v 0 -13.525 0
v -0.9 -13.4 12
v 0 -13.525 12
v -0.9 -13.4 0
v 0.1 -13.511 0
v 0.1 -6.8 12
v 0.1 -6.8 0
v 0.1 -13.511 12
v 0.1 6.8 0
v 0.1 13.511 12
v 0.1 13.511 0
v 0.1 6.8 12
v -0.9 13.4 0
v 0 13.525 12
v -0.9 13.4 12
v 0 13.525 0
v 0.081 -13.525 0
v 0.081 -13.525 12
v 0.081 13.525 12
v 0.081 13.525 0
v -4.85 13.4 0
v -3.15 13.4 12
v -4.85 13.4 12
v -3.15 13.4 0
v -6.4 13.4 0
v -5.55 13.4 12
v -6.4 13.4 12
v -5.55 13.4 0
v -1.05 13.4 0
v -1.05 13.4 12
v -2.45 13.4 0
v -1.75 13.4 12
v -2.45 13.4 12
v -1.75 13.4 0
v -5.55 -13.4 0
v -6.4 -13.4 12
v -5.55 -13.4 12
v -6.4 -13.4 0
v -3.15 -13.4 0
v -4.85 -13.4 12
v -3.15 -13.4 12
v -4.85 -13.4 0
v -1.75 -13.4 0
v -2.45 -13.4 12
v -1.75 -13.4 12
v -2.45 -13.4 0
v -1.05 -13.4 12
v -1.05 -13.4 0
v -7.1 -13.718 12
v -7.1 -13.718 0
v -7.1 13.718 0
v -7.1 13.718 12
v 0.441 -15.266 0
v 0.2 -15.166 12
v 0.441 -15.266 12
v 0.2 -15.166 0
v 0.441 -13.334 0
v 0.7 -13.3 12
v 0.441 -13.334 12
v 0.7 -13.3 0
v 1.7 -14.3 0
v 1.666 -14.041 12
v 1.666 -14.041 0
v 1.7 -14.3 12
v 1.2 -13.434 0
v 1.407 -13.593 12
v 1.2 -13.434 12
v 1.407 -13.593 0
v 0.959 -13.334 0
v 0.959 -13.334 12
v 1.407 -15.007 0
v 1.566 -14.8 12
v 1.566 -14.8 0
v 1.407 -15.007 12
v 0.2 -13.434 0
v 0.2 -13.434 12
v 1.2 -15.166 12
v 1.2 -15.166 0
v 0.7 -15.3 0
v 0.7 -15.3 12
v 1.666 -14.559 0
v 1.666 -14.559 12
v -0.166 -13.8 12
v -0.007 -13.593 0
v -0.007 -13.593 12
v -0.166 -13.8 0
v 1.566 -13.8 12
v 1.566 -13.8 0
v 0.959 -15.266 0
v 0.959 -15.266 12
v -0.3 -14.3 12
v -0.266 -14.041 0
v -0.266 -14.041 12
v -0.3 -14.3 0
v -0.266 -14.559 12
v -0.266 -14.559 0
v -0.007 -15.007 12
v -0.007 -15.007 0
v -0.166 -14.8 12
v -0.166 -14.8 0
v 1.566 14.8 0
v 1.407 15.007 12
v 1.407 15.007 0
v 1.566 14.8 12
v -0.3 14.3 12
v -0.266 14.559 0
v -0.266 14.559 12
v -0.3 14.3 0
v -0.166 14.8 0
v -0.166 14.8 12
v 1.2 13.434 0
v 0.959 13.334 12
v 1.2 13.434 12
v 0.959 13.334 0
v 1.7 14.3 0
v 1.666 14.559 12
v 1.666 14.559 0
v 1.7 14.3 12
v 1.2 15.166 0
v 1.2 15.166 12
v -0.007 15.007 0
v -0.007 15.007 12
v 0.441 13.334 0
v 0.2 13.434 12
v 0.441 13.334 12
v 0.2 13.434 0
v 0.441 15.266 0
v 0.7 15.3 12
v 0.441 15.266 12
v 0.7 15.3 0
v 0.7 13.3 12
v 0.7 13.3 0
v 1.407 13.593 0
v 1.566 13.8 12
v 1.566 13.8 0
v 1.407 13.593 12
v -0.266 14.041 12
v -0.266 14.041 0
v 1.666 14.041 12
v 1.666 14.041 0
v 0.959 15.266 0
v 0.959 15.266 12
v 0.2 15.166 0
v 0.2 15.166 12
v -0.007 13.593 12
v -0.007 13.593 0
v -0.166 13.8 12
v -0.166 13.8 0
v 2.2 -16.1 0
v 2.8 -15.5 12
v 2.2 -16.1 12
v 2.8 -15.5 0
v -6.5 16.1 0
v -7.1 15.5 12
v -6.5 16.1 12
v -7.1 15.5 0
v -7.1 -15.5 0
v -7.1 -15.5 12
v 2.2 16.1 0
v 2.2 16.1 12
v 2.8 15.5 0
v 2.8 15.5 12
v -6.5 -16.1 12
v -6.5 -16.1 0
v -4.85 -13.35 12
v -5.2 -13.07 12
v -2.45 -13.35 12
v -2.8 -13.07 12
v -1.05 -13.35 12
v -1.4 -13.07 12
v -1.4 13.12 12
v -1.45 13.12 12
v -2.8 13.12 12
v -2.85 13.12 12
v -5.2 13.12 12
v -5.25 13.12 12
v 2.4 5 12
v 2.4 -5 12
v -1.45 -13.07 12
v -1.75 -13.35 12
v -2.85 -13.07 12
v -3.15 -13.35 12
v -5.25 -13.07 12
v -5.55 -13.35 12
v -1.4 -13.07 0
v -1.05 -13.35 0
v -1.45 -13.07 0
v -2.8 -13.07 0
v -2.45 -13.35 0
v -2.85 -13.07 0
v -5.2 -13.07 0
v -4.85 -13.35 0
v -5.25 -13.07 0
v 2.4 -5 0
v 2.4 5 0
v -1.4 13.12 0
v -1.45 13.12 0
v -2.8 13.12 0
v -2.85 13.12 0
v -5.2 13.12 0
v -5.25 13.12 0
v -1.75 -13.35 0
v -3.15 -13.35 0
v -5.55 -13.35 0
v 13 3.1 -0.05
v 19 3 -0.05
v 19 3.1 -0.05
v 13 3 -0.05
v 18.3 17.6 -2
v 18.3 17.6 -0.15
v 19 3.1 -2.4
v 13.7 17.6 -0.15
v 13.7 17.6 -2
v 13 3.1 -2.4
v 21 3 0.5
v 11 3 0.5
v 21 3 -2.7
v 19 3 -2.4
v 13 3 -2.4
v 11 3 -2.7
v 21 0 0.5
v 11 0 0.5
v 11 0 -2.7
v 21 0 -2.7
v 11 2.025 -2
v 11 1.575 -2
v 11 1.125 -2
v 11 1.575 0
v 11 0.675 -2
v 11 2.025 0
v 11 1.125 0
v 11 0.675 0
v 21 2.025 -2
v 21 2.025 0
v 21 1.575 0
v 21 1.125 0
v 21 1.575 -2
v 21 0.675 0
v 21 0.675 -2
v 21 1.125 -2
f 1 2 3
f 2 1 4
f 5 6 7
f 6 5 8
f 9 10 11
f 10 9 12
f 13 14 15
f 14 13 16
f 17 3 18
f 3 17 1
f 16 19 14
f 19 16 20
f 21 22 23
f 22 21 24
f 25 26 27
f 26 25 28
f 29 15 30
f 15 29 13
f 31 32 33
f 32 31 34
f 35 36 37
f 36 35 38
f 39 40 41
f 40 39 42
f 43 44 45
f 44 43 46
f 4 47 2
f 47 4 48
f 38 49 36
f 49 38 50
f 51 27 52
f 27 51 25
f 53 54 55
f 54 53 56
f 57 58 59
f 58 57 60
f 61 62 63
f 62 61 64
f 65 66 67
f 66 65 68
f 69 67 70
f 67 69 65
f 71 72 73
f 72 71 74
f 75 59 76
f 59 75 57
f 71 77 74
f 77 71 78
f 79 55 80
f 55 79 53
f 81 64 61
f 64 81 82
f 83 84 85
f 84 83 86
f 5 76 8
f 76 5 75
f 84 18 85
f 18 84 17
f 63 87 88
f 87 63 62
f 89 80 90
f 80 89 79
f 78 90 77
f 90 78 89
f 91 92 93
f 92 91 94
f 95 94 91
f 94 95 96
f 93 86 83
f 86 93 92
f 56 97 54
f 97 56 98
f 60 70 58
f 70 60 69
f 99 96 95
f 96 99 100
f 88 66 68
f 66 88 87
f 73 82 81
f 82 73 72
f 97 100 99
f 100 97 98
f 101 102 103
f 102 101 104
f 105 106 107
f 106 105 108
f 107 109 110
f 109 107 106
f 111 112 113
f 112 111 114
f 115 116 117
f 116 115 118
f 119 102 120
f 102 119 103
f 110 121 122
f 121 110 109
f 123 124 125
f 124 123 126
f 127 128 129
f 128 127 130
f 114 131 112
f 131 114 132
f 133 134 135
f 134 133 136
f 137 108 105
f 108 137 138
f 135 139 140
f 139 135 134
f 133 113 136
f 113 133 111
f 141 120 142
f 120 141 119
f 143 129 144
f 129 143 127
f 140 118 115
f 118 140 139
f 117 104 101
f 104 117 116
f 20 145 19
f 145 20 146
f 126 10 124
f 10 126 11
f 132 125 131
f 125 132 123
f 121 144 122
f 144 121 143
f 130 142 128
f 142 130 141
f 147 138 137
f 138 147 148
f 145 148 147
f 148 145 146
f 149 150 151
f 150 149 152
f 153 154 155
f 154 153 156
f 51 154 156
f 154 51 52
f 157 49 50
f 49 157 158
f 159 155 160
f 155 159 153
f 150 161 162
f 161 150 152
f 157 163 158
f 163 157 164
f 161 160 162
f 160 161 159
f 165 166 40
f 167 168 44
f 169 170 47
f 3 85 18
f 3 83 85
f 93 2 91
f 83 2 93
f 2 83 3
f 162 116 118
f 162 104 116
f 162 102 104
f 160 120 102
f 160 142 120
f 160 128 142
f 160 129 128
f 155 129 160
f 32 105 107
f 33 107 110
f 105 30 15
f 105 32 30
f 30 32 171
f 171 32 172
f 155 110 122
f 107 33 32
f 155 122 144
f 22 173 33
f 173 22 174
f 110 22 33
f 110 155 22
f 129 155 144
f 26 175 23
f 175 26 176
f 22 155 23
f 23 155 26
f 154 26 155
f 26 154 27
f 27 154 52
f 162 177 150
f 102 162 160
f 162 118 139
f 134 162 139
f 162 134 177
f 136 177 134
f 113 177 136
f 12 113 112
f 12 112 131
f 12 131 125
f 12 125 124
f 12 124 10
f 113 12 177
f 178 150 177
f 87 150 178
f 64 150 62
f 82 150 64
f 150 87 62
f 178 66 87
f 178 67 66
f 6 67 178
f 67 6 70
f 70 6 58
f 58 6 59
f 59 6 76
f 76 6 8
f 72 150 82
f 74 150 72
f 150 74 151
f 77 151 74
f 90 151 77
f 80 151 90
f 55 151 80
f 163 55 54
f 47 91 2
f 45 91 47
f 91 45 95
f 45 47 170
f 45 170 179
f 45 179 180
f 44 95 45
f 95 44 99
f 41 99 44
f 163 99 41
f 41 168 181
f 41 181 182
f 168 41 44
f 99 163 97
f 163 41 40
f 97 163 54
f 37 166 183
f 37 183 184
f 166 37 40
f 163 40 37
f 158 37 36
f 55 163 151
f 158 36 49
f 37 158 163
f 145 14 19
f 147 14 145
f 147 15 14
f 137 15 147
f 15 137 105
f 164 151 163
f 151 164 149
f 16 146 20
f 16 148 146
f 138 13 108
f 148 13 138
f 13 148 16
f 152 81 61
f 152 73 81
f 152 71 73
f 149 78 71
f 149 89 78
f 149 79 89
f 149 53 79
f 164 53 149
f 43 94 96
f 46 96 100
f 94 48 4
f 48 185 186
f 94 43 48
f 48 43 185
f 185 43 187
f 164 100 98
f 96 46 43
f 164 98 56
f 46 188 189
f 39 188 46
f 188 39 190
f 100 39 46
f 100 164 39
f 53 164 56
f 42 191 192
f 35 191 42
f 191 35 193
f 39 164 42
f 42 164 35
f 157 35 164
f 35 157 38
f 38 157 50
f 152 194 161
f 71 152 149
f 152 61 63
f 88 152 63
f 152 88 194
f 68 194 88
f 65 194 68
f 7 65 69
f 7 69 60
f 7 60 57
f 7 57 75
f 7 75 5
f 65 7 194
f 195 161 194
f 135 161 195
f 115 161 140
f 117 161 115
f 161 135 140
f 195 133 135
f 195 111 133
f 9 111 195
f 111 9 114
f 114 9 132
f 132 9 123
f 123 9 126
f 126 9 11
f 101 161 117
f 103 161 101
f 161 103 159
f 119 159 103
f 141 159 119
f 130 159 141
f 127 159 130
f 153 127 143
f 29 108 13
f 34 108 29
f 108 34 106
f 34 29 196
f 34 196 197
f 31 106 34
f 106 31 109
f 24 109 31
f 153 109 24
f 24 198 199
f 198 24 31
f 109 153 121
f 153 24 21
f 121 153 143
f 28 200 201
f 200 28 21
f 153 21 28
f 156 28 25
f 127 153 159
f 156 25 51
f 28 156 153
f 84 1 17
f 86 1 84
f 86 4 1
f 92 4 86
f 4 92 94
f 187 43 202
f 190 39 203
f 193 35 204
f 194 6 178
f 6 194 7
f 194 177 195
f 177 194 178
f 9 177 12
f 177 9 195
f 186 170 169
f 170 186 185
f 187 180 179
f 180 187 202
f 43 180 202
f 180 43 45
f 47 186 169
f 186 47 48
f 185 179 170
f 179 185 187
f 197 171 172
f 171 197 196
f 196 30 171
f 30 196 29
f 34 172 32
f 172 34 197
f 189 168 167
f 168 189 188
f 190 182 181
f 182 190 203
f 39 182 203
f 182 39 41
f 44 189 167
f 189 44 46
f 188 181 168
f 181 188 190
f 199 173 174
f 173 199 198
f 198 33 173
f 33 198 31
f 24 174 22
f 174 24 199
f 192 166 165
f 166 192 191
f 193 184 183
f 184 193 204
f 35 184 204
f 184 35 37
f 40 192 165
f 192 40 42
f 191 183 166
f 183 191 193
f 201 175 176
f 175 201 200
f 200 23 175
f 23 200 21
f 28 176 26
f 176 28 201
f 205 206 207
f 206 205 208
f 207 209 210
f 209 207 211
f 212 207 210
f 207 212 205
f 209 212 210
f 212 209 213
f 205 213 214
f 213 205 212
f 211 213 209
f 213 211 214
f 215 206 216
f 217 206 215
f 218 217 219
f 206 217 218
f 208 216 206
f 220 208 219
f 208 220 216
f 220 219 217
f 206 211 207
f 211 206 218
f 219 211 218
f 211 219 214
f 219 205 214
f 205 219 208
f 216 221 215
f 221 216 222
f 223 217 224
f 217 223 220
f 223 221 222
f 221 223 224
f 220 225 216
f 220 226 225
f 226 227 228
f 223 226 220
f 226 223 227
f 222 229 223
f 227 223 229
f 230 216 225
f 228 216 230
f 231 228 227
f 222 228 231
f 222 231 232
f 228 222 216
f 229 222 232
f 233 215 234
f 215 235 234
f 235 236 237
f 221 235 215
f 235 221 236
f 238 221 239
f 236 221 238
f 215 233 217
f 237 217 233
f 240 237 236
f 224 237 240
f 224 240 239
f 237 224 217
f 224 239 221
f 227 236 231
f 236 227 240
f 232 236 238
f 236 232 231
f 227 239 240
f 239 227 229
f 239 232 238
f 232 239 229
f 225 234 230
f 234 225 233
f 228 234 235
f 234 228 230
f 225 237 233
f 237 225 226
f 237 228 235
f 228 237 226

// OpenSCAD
// ====================================================================
// Modular Mountain Bridge - PART 4: FULL-HEIGHT UNDER-DECK BASE CLAMP
// Precision Tall-Jaw Grip Clamp - RISES TO FULL DECK HEIGHT (7.00 MM)
//
// Engineering Specifications:
// - Deck Width: 27.00 mm
// - Total Deck Height: 7.00 mm (3.80mm roadway bed + 3.20mm outer safety railing)
// - Clamp Side Jaws Taller: Height is exactly 7.00 mm (full height of deck edge!)
//   -> Fully contacts both the lower deck plate and the outer railing wall
//   -> Zero intrusion onto the roadway travel lane (stops flush at railing top)
// - Pre-tensioned clamping jaws: 26.80mm inner width for 0.20mm active spring squeeze
// - 3-Tier internal horizontal gripping teeth (Z = 1.40mm, 2.80mm, 5.20mm)
// - Full-span bottom bed supporting the entire 27.00mm bridge underside
// - Transverse tapered locking wedge key (2.1° self-locking machine taper)
//   slides underneath the deck to lock it vertically in a rock-solid vise grip
// - 100% Watertight Manifold Solid (NoError), 0 Severe Overhangs
// ====================================================================

$fn = 36;

deck_w       = 27.00; // Exact deck width
deck_thick   = 3.80;  // Roadway plate thickness
deck_total_h = 7.00;  // Full deck edge height (3.80mm deck + 3.20mm railing)

clamp_len    = 12.00; // 12.0mm contact length along the bridge
pocket_h     = 7.00;  // Full deck height clamp jaws (flush with railing top Z = 7.00mm)
inner_w      = 26.80; // 0.20mm active interference pinch for tight side grip
wall_thick   = 2.60;  // Heavy structural spring sidewalls
base_thick   = 2.80;  // Rigid 2.80mm under-deck base floor

mode = "clamp_and_wedge"; // "clamp_and_wedge", "clamp_only", "wedge_only"

module biting_teeth_set() {
    // 3-Tier internal horizontal gripping teeth
    // Symmetrically projects 0.28mm into pocket to bite into deck edge & railing wall
    for (tz = [1.40, 2.80, 5.20]) {
        for (sy = [-1, 1]) {
            hull() {
                // Base on clamp inner wall
                translate([0, sy * inner_w/2, tz - 0.35])
                    cube([clamp_len, 0.05, 0.70]);
                // Triangular biting edge projecting into pocket
                translate([0, sy * (inner_w/2 - 0.28), tz])
                    cube([clamp_len, 0.05, 0.05]);
            }
        }
    }
}

module under_deck_clamp_body() {
    difference() {
        // 1. Solid Outer Clamp Body (Tall U-Channel rising to full deck height)
        hull() {
            // Bottom spine floor (Z = -base_thick)
            translate([0, -deck_w/2 - wall_thick + 0.6, -base_thick])
                cube([clamp_len, deck_w + 2 * wall_thick - 1.2, 0.1]);
            translate([0, -deck_w/2 - wall_thick, -base_thick + 0.6])
                cube([clamp_len, deck_w + 2 * wall_thick, 0.1]);
            // Main outer profile
            translate([0, -deck_w/2 - wall_thick, pocket_h - 0.6])
                cube([clamp_len, deck_w + 2 * wall_thick, 0.1]);
            // Top rim of tall jaws (Z = pocket_h = 7.00mm)
            translate([0, -deck_w/2 - wall_thick + 0.6, pocket_h])
                cube([clamp_len, deck_w + 2 * wall_thick - 1.2, 0.1]);
        }

        // 2. Full-Height Deck Pocket (Fits entire 27.0mm deck and rises to 7.0mm)
        union() {
            // Bottom seating bed (exact 27.05mm fit so deck drops all the way down)
            hull() {
                translate([-1.0, -27.05/2, -0.1])
                    cube([clamp_len + 2.0, 27.05, 0.1]);
                translate([-1.0, -inner_w/2, 0.8])
                    cube([clamp_len + 2.0, inner_w, 0.1]);
            }

            // Continuous tall pinch grip zone (26.80mm inner width from Z = 0.8 to Z = 6.4mm)
            translate([-1.0, -inner_w/2, 0.8])
                cube([clamp_len + 2.0, inner_w, pocket_h - 1.4]);

            // Top lead-in funnel (45° chamfered mouth from Z = 6.4mm to Z = 7.3mm)
            hull() {
                translate([-1.0, -inner_w/2, pocket_h - 0.6])
                    cube([clamp_len + 2.0, inner_w, 0.1]);
                translate([-1.0, -27.80/2, pocket_h + 0.5])
                    cube([clamp_len + 2.0, 27.80, 0.1]);
            }
        }

        // 3. Underside Transverse Wedge Keyway (Tapered dovetail channel under deck floor)
        // Sliding the wedge into this channel drives upward directly against the bottom of the deck
        hull() {
            translate([-1.0, -5.0, -base_thick + 0.4])
                cube([clamp_len + 2.0, 10.0, 0.1]);
            translate([-1.0, -6.8, -0.1])
                cube([clamp_len + 2.0, 13.6, 0.1]);
        }

        // 4. Compliance Spring Flex Notches at lower corners
        // Allows the 2.6mm sidewalls to flex elastically when pushing onto the 27.0mm deck
        for (sy = [-1, 1]) {
            translate([-1.0, sy * (deck_w/2 + 0.8), -0.7])
                rotate([0, 90, 0])
                    cylinder(r = 1.0, h = clamp_len + 2.0, $fn = 24);
        }
    }

    // Add 3-tier biting teeth
    biting_teeth_set();
}

module locking_wedge_key() {
    // Tapered locking wedge key (2.1° machine taper)
    // Drives into the underside keyway to lock the bottom of the deck in an absolute vise grip
    wedge_l = clamp_len + 6.0; // 18.0mm total length for easy handling and removal
    difference() {
        union() {
            // Tapered wedge body
            hull() {
                // Front thin lead-in tip (X = wedge_l)
                translate([wedge_l - 0.5, -4.6/2, -2.0])
                    cube([0.1, 4.6, 1.85]);
                // Rear thick locking wedge (X = 3.0mm, lifts deck bottom by 0.45mm into clamp jaws)
                translate([3.0, -6.0/2, -2.4])
                    cube([0.1, 6.0, 2.35]);
            }
            // Ergonomic rear push/pull tab (X = 0 to 3.0mm)
            translate([0, -10.0/2, -2.7])
                cube([3.0, 10.0, 3.2]);
        }

        // Finger grip knurling grooves on push tab
        for (rx = [0.9, 1.8]) {
            translate([rx, 0, -1.0])
                cube([0.45, 11.0, 2.0], center = true);
        }
    }
}

// ====================================================================
// PRINT BED LAYOUT (Oriented on side for continuous concentric XY loops)
// ====================================================================
if (mode == "clamp_and_wedge") {
    // Clamp oriented flat on side (Z = 0)
    rotate([0, -90, 0])
        under_deck_clamp_body();

    // Wedge key laid flat next to it
    translate([16.0, 0, 0])
        rotate([0, 0, 90])
            locking_wedge_key();

} else if (mode == "clamp_only") {
    rotate([0, -90, 0])
        under_deck_clamp_body();

} else if (mode == "wedge_only") {
    locking_wedge_key();
}
